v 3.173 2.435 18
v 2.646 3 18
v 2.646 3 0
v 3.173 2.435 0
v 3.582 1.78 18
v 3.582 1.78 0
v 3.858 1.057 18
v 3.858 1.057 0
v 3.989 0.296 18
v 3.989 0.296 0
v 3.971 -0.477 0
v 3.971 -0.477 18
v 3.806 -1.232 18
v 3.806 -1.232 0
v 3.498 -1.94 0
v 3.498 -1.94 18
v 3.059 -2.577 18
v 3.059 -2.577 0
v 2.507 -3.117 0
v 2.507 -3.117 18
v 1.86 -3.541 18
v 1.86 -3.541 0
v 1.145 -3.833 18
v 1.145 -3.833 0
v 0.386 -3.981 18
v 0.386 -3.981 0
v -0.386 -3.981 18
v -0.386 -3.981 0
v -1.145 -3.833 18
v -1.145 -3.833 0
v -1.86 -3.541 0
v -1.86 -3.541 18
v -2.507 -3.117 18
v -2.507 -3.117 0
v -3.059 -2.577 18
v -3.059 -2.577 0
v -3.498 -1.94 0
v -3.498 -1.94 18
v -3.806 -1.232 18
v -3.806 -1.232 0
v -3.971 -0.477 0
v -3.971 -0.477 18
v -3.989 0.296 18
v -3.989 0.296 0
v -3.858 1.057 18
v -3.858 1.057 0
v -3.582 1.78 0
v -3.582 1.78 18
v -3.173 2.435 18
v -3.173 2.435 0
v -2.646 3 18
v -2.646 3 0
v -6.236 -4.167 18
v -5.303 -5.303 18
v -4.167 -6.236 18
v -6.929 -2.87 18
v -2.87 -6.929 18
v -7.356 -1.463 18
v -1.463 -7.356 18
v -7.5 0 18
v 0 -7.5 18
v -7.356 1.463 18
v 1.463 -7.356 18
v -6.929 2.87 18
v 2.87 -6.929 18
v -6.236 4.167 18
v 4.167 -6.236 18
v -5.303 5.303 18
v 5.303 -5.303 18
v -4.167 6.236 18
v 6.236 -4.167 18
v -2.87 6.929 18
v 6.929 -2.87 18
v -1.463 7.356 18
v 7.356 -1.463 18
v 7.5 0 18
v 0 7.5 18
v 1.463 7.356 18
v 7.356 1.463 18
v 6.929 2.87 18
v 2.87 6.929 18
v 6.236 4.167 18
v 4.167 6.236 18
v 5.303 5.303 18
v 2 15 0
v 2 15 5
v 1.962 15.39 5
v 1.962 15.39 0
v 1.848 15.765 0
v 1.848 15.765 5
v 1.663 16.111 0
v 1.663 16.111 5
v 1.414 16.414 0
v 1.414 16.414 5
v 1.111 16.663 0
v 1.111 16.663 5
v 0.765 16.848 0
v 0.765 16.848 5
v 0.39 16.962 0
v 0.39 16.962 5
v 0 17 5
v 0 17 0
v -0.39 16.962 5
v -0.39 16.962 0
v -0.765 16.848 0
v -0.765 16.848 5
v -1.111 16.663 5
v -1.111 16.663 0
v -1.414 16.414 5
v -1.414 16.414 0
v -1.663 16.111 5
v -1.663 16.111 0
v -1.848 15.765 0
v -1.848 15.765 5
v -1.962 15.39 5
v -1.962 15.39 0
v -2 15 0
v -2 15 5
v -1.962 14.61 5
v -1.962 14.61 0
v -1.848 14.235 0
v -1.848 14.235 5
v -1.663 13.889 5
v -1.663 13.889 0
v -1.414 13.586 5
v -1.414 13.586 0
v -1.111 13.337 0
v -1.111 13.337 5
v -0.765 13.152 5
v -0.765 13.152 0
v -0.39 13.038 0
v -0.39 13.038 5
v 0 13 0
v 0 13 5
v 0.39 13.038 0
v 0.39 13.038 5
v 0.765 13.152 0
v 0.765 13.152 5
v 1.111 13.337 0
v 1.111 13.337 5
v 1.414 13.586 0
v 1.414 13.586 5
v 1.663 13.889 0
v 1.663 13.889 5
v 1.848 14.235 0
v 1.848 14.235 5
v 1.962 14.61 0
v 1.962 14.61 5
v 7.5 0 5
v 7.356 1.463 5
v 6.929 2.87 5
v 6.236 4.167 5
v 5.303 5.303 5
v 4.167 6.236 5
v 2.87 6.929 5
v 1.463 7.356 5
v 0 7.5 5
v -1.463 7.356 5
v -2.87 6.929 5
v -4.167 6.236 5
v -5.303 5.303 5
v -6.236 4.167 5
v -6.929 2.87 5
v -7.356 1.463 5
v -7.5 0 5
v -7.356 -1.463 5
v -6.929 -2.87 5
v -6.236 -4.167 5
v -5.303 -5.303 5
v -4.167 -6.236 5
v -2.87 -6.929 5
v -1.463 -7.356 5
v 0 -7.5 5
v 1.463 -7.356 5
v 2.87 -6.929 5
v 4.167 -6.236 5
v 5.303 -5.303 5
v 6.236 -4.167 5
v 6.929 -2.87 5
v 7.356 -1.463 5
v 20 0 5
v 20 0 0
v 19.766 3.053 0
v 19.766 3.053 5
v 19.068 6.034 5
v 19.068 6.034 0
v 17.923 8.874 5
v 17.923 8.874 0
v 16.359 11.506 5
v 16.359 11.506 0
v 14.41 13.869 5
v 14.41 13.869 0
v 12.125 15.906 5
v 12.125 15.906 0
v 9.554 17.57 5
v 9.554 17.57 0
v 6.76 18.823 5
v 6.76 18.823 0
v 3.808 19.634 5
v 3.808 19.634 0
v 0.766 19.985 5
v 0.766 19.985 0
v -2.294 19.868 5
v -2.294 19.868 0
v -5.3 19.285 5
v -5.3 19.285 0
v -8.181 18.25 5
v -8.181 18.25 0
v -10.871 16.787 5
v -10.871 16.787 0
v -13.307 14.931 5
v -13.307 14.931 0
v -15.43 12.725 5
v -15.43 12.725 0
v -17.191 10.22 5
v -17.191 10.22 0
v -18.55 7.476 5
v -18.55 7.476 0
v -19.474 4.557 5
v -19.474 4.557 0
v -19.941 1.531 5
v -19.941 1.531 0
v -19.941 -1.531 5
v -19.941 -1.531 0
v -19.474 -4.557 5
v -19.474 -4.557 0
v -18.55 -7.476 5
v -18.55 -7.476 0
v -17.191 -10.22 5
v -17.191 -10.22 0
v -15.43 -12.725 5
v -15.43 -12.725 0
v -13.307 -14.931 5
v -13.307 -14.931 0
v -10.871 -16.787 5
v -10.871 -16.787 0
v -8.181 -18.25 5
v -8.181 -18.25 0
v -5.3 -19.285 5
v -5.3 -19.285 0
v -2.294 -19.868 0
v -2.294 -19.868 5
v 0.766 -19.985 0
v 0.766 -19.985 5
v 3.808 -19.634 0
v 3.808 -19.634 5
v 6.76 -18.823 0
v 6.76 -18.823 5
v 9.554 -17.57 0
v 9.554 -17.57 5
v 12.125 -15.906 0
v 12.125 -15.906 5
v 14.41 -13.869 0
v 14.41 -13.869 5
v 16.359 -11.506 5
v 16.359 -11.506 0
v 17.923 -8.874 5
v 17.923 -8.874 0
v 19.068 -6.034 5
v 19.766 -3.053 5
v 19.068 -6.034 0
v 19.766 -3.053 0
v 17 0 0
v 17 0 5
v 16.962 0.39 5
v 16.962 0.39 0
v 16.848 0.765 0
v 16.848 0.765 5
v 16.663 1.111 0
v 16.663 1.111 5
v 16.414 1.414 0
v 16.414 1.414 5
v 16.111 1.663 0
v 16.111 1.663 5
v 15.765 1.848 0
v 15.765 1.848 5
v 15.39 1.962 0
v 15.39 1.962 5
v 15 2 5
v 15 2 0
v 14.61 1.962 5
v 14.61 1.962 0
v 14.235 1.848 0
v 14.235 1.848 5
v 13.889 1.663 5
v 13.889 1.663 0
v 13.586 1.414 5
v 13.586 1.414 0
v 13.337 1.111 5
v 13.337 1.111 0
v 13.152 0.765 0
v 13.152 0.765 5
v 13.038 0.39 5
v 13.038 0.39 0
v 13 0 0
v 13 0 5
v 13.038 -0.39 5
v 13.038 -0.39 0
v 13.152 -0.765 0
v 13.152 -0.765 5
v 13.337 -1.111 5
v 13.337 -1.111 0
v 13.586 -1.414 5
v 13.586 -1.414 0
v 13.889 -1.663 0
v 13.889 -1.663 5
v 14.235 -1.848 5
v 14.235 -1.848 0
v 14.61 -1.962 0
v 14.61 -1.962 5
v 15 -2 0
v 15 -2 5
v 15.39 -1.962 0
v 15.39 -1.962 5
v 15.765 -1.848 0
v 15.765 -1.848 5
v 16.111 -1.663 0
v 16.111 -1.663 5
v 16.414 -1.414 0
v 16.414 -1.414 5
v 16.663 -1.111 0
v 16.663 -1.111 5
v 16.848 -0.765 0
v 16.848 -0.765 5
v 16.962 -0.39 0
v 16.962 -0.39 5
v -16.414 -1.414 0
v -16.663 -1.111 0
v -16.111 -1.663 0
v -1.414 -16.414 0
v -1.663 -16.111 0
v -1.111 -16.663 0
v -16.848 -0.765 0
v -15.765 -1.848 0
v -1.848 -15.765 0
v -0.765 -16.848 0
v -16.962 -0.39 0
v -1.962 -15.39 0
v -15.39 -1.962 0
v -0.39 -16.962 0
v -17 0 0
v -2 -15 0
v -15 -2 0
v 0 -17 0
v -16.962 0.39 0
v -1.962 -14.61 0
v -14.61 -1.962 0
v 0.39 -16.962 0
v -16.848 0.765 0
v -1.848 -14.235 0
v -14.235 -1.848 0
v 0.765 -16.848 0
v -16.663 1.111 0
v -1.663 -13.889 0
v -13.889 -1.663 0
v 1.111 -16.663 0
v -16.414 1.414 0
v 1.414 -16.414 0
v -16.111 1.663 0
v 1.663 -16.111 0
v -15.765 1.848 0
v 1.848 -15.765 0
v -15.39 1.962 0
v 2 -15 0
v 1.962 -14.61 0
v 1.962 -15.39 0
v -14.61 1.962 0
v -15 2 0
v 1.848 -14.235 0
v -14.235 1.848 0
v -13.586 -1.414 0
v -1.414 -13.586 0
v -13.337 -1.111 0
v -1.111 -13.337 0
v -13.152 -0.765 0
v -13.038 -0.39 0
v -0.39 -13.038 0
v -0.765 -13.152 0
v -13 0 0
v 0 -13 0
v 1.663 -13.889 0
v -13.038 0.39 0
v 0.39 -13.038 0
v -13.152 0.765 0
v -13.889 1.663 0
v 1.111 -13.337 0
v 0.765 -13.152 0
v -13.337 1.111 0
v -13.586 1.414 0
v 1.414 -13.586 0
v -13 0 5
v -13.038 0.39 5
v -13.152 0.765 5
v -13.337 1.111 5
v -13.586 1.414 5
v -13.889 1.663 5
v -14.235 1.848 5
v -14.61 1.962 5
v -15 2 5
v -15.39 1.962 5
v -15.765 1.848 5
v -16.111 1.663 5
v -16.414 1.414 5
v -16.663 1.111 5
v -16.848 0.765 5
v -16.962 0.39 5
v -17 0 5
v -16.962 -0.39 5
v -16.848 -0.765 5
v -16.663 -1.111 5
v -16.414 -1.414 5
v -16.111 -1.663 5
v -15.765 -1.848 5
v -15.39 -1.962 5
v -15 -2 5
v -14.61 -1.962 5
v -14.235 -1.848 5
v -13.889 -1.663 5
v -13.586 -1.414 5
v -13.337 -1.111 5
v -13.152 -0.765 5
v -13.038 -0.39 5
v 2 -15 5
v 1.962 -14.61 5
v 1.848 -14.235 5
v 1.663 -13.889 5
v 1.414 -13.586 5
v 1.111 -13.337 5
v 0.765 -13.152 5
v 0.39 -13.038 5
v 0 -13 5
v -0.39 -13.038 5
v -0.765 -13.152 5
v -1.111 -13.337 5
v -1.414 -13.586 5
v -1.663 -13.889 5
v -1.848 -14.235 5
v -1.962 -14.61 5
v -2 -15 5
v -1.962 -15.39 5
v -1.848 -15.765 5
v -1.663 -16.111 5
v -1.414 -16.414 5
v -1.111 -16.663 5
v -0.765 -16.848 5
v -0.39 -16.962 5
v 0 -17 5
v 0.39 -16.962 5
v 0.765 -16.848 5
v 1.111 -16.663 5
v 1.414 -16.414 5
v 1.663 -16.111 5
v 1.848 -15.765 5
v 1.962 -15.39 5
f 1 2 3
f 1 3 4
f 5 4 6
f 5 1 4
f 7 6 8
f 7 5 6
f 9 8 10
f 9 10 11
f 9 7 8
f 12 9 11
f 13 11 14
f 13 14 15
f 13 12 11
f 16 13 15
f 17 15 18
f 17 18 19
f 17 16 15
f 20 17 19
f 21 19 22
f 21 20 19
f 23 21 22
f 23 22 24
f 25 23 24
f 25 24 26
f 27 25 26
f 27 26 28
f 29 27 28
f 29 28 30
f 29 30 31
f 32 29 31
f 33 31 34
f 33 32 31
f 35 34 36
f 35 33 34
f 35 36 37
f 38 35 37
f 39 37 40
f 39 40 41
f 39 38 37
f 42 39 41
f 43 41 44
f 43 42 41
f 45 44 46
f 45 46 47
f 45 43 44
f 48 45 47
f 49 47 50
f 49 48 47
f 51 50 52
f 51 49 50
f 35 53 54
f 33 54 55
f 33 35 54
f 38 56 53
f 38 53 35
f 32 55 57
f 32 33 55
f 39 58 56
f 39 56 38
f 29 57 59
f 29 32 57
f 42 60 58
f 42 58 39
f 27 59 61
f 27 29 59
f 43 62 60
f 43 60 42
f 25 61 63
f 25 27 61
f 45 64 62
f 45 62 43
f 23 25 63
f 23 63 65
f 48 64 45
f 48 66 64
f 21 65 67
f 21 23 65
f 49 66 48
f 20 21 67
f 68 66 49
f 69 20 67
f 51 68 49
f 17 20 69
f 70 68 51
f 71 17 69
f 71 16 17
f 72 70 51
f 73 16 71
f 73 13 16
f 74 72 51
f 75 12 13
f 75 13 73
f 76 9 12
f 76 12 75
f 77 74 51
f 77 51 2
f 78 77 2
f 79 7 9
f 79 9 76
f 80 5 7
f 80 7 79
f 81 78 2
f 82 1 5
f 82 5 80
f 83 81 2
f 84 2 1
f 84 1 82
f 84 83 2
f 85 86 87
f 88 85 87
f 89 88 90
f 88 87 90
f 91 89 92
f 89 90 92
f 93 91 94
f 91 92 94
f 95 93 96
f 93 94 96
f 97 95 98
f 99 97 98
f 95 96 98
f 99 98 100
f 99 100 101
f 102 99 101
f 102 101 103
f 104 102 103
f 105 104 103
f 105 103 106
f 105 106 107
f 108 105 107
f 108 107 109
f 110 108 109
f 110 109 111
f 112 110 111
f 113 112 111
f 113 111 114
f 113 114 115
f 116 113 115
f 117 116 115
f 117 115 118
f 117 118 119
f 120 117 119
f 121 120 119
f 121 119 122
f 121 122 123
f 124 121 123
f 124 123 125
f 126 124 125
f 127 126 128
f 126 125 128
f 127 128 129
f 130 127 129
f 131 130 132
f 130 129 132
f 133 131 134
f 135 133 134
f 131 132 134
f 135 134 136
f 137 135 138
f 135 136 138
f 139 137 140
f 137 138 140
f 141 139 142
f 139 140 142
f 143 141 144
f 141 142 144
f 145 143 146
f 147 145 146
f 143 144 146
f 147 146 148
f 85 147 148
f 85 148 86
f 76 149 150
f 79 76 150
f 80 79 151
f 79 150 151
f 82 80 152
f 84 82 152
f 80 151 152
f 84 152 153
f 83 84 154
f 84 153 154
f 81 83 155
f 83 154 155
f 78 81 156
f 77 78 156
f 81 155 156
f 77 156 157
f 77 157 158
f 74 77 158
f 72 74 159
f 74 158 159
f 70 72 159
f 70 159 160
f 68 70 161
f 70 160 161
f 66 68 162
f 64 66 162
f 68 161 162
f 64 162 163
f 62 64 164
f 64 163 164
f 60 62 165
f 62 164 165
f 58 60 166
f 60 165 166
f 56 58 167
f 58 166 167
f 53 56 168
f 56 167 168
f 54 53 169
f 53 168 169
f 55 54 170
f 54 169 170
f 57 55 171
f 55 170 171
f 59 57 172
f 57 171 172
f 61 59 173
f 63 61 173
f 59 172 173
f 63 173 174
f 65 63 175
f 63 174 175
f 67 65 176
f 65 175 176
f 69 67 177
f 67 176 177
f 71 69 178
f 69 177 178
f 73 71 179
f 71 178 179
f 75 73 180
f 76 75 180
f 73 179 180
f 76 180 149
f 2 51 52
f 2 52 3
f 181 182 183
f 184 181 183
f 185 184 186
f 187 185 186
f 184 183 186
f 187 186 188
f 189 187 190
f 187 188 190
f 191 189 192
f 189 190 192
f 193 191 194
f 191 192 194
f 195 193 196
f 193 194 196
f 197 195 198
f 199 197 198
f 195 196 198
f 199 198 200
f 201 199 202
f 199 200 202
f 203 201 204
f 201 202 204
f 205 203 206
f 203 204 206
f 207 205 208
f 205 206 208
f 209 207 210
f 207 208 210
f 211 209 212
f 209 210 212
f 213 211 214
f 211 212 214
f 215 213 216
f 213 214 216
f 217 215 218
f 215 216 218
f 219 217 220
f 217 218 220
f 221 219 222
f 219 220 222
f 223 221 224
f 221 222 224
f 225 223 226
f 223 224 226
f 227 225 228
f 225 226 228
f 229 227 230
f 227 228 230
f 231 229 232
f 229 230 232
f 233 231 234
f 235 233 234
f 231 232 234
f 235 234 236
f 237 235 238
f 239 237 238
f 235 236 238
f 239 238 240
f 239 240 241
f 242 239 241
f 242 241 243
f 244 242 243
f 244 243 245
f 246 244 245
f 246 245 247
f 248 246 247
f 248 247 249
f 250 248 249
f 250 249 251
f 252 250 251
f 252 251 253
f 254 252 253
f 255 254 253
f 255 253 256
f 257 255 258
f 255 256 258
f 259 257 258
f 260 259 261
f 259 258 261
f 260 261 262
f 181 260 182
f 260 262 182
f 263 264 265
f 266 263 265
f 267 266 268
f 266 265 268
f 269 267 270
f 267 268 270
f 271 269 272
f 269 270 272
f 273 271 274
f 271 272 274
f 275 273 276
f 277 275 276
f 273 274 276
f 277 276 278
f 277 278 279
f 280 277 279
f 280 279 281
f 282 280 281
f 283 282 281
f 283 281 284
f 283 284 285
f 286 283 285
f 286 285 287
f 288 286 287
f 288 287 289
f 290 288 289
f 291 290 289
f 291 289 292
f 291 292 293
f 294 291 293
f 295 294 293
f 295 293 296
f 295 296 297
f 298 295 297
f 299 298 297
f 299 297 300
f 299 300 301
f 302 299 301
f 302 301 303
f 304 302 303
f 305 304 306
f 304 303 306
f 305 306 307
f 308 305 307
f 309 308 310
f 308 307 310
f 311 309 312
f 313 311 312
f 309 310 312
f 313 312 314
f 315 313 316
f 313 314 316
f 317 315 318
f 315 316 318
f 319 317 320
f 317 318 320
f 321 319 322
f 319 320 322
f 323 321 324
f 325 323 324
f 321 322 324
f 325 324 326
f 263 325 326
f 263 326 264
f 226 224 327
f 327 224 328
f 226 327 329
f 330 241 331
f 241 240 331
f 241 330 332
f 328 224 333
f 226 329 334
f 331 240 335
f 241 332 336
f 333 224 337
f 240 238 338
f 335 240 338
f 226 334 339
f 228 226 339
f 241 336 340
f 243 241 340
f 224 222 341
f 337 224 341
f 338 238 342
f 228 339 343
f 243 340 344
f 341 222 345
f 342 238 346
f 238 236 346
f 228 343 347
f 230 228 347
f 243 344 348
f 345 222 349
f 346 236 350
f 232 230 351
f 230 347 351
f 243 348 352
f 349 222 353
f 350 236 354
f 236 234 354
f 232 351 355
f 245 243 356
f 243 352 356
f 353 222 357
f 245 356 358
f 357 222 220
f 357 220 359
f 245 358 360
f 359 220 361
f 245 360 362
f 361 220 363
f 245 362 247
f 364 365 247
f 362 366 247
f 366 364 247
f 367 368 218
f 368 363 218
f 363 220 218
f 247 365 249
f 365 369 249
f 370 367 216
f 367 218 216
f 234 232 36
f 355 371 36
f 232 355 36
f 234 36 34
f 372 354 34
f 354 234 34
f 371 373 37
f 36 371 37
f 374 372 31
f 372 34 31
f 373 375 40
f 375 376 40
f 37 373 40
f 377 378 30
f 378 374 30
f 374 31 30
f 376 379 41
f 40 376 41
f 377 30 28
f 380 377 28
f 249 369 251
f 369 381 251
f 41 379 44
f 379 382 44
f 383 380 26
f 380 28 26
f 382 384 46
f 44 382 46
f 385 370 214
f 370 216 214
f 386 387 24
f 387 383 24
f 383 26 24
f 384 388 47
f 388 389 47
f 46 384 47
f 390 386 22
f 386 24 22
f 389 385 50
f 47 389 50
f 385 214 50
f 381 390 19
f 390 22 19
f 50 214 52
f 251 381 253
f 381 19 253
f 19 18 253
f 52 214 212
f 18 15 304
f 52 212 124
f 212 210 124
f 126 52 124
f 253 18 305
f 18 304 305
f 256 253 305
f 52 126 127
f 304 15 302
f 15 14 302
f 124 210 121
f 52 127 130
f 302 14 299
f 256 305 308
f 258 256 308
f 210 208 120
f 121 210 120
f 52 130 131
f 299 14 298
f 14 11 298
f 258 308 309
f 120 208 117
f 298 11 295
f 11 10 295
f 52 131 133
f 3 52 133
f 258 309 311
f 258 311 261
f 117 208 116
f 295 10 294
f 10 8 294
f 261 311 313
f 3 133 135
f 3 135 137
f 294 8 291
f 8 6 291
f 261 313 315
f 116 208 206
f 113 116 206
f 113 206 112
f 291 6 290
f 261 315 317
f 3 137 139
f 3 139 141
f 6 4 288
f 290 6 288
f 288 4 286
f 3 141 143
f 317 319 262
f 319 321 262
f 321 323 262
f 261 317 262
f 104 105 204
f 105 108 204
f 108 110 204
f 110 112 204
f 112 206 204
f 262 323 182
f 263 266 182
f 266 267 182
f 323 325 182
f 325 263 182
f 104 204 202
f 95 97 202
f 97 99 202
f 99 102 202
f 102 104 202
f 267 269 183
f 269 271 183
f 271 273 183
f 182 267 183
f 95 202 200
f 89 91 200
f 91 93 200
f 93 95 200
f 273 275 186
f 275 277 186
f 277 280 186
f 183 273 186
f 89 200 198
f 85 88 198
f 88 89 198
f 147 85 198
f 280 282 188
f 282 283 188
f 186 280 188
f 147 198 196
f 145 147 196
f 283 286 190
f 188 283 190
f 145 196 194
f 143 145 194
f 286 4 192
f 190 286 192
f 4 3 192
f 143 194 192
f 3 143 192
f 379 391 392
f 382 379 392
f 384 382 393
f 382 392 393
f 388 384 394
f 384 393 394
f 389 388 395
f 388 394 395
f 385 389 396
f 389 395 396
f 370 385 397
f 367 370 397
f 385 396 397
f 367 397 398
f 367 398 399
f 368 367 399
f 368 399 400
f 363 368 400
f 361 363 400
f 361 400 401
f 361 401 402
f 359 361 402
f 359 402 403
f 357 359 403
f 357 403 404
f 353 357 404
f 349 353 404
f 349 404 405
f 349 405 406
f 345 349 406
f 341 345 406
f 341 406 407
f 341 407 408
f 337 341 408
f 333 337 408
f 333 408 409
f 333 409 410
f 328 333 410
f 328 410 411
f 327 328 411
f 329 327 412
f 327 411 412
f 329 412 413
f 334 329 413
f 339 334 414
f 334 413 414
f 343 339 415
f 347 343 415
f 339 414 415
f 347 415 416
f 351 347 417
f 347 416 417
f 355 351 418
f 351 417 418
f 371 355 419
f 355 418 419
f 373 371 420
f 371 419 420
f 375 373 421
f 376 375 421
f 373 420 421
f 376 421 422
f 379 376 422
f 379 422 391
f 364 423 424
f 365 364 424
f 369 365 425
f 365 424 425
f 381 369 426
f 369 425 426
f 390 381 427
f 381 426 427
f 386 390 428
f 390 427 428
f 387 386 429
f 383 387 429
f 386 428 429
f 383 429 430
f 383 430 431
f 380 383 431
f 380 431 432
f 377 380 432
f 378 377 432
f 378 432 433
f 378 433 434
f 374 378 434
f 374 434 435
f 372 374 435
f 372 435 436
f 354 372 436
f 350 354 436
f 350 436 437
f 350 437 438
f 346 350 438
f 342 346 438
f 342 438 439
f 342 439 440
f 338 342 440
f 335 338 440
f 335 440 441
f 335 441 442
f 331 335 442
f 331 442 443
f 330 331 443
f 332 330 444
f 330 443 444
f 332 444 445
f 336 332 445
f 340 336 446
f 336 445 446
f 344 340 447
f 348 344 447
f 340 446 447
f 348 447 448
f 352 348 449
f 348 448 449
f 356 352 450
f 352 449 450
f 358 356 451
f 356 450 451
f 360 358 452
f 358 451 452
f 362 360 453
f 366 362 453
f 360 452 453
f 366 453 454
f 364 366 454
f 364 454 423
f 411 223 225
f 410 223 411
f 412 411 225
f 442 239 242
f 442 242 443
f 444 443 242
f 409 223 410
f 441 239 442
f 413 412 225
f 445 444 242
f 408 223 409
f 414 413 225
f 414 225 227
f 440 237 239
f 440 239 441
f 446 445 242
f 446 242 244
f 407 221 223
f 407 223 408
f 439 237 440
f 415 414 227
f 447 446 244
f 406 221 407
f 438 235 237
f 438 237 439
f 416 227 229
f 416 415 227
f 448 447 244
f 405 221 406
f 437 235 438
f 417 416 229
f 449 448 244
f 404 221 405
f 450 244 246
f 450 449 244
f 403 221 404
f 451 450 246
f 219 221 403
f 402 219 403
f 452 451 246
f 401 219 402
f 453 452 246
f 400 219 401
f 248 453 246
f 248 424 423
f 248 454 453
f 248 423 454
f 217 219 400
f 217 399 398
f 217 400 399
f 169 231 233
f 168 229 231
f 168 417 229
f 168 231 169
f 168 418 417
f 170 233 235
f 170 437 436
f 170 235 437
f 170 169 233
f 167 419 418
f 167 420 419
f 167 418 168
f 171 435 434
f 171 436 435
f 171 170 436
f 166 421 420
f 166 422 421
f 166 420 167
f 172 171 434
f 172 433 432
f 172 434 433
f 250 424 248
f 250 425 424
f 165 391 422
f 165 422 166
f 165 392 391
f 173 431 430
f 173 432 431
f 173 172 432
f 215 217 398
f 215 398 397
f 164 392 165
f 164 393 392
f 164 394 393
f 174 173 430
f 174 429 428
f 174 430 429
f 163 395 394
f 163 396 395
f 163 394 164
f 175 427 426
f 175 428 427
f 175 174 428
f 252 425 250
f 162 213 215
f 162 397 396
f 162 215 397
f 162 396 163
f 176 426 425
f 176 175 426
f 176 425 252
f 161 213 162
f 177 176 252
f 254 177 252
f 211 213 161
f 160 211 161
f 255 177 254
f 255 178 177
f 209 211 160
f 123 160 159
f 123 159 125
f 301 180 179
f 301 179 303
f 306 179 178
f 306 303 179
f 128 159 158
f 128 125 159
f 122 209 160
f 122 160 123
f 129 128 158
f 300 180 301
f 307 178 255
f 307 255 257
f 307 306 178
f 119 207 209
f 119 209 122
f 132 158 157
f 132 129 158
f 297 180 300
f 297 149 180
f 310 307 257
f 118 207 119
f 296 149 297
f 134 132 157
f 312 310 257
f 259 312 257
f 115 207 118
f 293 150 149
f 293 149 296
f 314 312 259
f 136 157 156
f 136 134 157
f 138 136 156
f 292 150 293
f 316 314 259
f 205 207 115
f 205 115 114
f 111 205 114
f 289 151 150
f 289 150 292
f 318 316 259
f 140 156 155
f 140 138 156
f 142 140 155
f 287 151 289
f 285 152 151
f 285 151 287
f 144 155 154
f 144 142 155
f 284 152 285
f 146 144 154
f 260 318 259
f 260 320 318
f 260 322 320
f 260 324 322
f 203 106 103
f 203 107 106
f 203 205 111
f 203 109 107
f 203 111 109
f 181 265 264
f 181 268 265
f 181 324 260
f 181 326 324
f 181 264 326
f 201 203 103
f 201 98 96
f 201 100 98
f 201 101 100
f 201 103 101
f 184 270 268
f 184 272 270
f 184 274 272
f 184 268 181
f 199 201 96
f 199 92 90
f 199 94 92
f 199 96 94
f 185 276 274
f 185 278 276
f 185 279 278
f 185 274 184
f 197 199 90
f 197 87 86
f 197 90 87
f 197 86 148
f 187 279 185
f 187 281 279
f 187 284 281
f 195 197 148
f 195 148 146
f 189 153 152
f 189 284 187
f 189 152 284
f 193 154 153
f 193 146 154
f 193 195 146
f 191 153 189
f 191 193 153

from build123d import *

# Parameters (mm, degrees)
SKETCH1_R           = 20
BOSS_EXTRUDE1_DEPTH = 5
SKETCH2_R           = 7.5
BOSS_EXTRUDE2_DEPTH = 13
CUT_EXTRUDE1_DEPTH  = 18
SKETCH4_R           = 2
CUT_EXTRUDE2_DEPTH  = 18


with BuildPart() as part:
    # Sketch1 → Boss-Extrude1 (new body)
    with BuildSketch(Plane.XY):
        Circle(SKETCH1_R)
    extrude(amount=BOSS_EXTRUDE1_DEPTH)

    # Sketch2 → Boss-Extrude2 (add)
    with BuildSketch(Plane.XY.offset(5)):
        Circle(SKETCH2_R)
    extrude(amount=BOSS_EXTRUDE2_DEPTH)

    # Sketch3 → Cut-Extrude1 (cut)
    with BuildSketch(Plane.XY.offset(18)):
        with BuildLine():
            Line((-2.645751311, 3), (2.645751311, 3))
            ThreePointArc((2.645751311, 3), (0, -4), (-2.645751311, 3))
        make_face()
    extrude(amount=-CUT_EXTRUDE1_DEPTH, mode=Mode.SUBTRACT)

    # Sketch4 → Cut-Extrude2 (cut)
    with BuildSketch(Plane.XY.offset(5)):
        with Locations((0, 15)):
            Circle(SKETCH4_R)
        with Locations((15, 0)):
            Circle(SKETCH4_R)
        with Locations((0, -15)):
            Circle(SKETCH4_R)
        with Locations((-15, 0)):
            Circle(SKETCH4_R)
    extrude(amount=-CUT_EXTRUDE2_DEPTH, mode=Mode.SUBTRACT)


solid = part.part
